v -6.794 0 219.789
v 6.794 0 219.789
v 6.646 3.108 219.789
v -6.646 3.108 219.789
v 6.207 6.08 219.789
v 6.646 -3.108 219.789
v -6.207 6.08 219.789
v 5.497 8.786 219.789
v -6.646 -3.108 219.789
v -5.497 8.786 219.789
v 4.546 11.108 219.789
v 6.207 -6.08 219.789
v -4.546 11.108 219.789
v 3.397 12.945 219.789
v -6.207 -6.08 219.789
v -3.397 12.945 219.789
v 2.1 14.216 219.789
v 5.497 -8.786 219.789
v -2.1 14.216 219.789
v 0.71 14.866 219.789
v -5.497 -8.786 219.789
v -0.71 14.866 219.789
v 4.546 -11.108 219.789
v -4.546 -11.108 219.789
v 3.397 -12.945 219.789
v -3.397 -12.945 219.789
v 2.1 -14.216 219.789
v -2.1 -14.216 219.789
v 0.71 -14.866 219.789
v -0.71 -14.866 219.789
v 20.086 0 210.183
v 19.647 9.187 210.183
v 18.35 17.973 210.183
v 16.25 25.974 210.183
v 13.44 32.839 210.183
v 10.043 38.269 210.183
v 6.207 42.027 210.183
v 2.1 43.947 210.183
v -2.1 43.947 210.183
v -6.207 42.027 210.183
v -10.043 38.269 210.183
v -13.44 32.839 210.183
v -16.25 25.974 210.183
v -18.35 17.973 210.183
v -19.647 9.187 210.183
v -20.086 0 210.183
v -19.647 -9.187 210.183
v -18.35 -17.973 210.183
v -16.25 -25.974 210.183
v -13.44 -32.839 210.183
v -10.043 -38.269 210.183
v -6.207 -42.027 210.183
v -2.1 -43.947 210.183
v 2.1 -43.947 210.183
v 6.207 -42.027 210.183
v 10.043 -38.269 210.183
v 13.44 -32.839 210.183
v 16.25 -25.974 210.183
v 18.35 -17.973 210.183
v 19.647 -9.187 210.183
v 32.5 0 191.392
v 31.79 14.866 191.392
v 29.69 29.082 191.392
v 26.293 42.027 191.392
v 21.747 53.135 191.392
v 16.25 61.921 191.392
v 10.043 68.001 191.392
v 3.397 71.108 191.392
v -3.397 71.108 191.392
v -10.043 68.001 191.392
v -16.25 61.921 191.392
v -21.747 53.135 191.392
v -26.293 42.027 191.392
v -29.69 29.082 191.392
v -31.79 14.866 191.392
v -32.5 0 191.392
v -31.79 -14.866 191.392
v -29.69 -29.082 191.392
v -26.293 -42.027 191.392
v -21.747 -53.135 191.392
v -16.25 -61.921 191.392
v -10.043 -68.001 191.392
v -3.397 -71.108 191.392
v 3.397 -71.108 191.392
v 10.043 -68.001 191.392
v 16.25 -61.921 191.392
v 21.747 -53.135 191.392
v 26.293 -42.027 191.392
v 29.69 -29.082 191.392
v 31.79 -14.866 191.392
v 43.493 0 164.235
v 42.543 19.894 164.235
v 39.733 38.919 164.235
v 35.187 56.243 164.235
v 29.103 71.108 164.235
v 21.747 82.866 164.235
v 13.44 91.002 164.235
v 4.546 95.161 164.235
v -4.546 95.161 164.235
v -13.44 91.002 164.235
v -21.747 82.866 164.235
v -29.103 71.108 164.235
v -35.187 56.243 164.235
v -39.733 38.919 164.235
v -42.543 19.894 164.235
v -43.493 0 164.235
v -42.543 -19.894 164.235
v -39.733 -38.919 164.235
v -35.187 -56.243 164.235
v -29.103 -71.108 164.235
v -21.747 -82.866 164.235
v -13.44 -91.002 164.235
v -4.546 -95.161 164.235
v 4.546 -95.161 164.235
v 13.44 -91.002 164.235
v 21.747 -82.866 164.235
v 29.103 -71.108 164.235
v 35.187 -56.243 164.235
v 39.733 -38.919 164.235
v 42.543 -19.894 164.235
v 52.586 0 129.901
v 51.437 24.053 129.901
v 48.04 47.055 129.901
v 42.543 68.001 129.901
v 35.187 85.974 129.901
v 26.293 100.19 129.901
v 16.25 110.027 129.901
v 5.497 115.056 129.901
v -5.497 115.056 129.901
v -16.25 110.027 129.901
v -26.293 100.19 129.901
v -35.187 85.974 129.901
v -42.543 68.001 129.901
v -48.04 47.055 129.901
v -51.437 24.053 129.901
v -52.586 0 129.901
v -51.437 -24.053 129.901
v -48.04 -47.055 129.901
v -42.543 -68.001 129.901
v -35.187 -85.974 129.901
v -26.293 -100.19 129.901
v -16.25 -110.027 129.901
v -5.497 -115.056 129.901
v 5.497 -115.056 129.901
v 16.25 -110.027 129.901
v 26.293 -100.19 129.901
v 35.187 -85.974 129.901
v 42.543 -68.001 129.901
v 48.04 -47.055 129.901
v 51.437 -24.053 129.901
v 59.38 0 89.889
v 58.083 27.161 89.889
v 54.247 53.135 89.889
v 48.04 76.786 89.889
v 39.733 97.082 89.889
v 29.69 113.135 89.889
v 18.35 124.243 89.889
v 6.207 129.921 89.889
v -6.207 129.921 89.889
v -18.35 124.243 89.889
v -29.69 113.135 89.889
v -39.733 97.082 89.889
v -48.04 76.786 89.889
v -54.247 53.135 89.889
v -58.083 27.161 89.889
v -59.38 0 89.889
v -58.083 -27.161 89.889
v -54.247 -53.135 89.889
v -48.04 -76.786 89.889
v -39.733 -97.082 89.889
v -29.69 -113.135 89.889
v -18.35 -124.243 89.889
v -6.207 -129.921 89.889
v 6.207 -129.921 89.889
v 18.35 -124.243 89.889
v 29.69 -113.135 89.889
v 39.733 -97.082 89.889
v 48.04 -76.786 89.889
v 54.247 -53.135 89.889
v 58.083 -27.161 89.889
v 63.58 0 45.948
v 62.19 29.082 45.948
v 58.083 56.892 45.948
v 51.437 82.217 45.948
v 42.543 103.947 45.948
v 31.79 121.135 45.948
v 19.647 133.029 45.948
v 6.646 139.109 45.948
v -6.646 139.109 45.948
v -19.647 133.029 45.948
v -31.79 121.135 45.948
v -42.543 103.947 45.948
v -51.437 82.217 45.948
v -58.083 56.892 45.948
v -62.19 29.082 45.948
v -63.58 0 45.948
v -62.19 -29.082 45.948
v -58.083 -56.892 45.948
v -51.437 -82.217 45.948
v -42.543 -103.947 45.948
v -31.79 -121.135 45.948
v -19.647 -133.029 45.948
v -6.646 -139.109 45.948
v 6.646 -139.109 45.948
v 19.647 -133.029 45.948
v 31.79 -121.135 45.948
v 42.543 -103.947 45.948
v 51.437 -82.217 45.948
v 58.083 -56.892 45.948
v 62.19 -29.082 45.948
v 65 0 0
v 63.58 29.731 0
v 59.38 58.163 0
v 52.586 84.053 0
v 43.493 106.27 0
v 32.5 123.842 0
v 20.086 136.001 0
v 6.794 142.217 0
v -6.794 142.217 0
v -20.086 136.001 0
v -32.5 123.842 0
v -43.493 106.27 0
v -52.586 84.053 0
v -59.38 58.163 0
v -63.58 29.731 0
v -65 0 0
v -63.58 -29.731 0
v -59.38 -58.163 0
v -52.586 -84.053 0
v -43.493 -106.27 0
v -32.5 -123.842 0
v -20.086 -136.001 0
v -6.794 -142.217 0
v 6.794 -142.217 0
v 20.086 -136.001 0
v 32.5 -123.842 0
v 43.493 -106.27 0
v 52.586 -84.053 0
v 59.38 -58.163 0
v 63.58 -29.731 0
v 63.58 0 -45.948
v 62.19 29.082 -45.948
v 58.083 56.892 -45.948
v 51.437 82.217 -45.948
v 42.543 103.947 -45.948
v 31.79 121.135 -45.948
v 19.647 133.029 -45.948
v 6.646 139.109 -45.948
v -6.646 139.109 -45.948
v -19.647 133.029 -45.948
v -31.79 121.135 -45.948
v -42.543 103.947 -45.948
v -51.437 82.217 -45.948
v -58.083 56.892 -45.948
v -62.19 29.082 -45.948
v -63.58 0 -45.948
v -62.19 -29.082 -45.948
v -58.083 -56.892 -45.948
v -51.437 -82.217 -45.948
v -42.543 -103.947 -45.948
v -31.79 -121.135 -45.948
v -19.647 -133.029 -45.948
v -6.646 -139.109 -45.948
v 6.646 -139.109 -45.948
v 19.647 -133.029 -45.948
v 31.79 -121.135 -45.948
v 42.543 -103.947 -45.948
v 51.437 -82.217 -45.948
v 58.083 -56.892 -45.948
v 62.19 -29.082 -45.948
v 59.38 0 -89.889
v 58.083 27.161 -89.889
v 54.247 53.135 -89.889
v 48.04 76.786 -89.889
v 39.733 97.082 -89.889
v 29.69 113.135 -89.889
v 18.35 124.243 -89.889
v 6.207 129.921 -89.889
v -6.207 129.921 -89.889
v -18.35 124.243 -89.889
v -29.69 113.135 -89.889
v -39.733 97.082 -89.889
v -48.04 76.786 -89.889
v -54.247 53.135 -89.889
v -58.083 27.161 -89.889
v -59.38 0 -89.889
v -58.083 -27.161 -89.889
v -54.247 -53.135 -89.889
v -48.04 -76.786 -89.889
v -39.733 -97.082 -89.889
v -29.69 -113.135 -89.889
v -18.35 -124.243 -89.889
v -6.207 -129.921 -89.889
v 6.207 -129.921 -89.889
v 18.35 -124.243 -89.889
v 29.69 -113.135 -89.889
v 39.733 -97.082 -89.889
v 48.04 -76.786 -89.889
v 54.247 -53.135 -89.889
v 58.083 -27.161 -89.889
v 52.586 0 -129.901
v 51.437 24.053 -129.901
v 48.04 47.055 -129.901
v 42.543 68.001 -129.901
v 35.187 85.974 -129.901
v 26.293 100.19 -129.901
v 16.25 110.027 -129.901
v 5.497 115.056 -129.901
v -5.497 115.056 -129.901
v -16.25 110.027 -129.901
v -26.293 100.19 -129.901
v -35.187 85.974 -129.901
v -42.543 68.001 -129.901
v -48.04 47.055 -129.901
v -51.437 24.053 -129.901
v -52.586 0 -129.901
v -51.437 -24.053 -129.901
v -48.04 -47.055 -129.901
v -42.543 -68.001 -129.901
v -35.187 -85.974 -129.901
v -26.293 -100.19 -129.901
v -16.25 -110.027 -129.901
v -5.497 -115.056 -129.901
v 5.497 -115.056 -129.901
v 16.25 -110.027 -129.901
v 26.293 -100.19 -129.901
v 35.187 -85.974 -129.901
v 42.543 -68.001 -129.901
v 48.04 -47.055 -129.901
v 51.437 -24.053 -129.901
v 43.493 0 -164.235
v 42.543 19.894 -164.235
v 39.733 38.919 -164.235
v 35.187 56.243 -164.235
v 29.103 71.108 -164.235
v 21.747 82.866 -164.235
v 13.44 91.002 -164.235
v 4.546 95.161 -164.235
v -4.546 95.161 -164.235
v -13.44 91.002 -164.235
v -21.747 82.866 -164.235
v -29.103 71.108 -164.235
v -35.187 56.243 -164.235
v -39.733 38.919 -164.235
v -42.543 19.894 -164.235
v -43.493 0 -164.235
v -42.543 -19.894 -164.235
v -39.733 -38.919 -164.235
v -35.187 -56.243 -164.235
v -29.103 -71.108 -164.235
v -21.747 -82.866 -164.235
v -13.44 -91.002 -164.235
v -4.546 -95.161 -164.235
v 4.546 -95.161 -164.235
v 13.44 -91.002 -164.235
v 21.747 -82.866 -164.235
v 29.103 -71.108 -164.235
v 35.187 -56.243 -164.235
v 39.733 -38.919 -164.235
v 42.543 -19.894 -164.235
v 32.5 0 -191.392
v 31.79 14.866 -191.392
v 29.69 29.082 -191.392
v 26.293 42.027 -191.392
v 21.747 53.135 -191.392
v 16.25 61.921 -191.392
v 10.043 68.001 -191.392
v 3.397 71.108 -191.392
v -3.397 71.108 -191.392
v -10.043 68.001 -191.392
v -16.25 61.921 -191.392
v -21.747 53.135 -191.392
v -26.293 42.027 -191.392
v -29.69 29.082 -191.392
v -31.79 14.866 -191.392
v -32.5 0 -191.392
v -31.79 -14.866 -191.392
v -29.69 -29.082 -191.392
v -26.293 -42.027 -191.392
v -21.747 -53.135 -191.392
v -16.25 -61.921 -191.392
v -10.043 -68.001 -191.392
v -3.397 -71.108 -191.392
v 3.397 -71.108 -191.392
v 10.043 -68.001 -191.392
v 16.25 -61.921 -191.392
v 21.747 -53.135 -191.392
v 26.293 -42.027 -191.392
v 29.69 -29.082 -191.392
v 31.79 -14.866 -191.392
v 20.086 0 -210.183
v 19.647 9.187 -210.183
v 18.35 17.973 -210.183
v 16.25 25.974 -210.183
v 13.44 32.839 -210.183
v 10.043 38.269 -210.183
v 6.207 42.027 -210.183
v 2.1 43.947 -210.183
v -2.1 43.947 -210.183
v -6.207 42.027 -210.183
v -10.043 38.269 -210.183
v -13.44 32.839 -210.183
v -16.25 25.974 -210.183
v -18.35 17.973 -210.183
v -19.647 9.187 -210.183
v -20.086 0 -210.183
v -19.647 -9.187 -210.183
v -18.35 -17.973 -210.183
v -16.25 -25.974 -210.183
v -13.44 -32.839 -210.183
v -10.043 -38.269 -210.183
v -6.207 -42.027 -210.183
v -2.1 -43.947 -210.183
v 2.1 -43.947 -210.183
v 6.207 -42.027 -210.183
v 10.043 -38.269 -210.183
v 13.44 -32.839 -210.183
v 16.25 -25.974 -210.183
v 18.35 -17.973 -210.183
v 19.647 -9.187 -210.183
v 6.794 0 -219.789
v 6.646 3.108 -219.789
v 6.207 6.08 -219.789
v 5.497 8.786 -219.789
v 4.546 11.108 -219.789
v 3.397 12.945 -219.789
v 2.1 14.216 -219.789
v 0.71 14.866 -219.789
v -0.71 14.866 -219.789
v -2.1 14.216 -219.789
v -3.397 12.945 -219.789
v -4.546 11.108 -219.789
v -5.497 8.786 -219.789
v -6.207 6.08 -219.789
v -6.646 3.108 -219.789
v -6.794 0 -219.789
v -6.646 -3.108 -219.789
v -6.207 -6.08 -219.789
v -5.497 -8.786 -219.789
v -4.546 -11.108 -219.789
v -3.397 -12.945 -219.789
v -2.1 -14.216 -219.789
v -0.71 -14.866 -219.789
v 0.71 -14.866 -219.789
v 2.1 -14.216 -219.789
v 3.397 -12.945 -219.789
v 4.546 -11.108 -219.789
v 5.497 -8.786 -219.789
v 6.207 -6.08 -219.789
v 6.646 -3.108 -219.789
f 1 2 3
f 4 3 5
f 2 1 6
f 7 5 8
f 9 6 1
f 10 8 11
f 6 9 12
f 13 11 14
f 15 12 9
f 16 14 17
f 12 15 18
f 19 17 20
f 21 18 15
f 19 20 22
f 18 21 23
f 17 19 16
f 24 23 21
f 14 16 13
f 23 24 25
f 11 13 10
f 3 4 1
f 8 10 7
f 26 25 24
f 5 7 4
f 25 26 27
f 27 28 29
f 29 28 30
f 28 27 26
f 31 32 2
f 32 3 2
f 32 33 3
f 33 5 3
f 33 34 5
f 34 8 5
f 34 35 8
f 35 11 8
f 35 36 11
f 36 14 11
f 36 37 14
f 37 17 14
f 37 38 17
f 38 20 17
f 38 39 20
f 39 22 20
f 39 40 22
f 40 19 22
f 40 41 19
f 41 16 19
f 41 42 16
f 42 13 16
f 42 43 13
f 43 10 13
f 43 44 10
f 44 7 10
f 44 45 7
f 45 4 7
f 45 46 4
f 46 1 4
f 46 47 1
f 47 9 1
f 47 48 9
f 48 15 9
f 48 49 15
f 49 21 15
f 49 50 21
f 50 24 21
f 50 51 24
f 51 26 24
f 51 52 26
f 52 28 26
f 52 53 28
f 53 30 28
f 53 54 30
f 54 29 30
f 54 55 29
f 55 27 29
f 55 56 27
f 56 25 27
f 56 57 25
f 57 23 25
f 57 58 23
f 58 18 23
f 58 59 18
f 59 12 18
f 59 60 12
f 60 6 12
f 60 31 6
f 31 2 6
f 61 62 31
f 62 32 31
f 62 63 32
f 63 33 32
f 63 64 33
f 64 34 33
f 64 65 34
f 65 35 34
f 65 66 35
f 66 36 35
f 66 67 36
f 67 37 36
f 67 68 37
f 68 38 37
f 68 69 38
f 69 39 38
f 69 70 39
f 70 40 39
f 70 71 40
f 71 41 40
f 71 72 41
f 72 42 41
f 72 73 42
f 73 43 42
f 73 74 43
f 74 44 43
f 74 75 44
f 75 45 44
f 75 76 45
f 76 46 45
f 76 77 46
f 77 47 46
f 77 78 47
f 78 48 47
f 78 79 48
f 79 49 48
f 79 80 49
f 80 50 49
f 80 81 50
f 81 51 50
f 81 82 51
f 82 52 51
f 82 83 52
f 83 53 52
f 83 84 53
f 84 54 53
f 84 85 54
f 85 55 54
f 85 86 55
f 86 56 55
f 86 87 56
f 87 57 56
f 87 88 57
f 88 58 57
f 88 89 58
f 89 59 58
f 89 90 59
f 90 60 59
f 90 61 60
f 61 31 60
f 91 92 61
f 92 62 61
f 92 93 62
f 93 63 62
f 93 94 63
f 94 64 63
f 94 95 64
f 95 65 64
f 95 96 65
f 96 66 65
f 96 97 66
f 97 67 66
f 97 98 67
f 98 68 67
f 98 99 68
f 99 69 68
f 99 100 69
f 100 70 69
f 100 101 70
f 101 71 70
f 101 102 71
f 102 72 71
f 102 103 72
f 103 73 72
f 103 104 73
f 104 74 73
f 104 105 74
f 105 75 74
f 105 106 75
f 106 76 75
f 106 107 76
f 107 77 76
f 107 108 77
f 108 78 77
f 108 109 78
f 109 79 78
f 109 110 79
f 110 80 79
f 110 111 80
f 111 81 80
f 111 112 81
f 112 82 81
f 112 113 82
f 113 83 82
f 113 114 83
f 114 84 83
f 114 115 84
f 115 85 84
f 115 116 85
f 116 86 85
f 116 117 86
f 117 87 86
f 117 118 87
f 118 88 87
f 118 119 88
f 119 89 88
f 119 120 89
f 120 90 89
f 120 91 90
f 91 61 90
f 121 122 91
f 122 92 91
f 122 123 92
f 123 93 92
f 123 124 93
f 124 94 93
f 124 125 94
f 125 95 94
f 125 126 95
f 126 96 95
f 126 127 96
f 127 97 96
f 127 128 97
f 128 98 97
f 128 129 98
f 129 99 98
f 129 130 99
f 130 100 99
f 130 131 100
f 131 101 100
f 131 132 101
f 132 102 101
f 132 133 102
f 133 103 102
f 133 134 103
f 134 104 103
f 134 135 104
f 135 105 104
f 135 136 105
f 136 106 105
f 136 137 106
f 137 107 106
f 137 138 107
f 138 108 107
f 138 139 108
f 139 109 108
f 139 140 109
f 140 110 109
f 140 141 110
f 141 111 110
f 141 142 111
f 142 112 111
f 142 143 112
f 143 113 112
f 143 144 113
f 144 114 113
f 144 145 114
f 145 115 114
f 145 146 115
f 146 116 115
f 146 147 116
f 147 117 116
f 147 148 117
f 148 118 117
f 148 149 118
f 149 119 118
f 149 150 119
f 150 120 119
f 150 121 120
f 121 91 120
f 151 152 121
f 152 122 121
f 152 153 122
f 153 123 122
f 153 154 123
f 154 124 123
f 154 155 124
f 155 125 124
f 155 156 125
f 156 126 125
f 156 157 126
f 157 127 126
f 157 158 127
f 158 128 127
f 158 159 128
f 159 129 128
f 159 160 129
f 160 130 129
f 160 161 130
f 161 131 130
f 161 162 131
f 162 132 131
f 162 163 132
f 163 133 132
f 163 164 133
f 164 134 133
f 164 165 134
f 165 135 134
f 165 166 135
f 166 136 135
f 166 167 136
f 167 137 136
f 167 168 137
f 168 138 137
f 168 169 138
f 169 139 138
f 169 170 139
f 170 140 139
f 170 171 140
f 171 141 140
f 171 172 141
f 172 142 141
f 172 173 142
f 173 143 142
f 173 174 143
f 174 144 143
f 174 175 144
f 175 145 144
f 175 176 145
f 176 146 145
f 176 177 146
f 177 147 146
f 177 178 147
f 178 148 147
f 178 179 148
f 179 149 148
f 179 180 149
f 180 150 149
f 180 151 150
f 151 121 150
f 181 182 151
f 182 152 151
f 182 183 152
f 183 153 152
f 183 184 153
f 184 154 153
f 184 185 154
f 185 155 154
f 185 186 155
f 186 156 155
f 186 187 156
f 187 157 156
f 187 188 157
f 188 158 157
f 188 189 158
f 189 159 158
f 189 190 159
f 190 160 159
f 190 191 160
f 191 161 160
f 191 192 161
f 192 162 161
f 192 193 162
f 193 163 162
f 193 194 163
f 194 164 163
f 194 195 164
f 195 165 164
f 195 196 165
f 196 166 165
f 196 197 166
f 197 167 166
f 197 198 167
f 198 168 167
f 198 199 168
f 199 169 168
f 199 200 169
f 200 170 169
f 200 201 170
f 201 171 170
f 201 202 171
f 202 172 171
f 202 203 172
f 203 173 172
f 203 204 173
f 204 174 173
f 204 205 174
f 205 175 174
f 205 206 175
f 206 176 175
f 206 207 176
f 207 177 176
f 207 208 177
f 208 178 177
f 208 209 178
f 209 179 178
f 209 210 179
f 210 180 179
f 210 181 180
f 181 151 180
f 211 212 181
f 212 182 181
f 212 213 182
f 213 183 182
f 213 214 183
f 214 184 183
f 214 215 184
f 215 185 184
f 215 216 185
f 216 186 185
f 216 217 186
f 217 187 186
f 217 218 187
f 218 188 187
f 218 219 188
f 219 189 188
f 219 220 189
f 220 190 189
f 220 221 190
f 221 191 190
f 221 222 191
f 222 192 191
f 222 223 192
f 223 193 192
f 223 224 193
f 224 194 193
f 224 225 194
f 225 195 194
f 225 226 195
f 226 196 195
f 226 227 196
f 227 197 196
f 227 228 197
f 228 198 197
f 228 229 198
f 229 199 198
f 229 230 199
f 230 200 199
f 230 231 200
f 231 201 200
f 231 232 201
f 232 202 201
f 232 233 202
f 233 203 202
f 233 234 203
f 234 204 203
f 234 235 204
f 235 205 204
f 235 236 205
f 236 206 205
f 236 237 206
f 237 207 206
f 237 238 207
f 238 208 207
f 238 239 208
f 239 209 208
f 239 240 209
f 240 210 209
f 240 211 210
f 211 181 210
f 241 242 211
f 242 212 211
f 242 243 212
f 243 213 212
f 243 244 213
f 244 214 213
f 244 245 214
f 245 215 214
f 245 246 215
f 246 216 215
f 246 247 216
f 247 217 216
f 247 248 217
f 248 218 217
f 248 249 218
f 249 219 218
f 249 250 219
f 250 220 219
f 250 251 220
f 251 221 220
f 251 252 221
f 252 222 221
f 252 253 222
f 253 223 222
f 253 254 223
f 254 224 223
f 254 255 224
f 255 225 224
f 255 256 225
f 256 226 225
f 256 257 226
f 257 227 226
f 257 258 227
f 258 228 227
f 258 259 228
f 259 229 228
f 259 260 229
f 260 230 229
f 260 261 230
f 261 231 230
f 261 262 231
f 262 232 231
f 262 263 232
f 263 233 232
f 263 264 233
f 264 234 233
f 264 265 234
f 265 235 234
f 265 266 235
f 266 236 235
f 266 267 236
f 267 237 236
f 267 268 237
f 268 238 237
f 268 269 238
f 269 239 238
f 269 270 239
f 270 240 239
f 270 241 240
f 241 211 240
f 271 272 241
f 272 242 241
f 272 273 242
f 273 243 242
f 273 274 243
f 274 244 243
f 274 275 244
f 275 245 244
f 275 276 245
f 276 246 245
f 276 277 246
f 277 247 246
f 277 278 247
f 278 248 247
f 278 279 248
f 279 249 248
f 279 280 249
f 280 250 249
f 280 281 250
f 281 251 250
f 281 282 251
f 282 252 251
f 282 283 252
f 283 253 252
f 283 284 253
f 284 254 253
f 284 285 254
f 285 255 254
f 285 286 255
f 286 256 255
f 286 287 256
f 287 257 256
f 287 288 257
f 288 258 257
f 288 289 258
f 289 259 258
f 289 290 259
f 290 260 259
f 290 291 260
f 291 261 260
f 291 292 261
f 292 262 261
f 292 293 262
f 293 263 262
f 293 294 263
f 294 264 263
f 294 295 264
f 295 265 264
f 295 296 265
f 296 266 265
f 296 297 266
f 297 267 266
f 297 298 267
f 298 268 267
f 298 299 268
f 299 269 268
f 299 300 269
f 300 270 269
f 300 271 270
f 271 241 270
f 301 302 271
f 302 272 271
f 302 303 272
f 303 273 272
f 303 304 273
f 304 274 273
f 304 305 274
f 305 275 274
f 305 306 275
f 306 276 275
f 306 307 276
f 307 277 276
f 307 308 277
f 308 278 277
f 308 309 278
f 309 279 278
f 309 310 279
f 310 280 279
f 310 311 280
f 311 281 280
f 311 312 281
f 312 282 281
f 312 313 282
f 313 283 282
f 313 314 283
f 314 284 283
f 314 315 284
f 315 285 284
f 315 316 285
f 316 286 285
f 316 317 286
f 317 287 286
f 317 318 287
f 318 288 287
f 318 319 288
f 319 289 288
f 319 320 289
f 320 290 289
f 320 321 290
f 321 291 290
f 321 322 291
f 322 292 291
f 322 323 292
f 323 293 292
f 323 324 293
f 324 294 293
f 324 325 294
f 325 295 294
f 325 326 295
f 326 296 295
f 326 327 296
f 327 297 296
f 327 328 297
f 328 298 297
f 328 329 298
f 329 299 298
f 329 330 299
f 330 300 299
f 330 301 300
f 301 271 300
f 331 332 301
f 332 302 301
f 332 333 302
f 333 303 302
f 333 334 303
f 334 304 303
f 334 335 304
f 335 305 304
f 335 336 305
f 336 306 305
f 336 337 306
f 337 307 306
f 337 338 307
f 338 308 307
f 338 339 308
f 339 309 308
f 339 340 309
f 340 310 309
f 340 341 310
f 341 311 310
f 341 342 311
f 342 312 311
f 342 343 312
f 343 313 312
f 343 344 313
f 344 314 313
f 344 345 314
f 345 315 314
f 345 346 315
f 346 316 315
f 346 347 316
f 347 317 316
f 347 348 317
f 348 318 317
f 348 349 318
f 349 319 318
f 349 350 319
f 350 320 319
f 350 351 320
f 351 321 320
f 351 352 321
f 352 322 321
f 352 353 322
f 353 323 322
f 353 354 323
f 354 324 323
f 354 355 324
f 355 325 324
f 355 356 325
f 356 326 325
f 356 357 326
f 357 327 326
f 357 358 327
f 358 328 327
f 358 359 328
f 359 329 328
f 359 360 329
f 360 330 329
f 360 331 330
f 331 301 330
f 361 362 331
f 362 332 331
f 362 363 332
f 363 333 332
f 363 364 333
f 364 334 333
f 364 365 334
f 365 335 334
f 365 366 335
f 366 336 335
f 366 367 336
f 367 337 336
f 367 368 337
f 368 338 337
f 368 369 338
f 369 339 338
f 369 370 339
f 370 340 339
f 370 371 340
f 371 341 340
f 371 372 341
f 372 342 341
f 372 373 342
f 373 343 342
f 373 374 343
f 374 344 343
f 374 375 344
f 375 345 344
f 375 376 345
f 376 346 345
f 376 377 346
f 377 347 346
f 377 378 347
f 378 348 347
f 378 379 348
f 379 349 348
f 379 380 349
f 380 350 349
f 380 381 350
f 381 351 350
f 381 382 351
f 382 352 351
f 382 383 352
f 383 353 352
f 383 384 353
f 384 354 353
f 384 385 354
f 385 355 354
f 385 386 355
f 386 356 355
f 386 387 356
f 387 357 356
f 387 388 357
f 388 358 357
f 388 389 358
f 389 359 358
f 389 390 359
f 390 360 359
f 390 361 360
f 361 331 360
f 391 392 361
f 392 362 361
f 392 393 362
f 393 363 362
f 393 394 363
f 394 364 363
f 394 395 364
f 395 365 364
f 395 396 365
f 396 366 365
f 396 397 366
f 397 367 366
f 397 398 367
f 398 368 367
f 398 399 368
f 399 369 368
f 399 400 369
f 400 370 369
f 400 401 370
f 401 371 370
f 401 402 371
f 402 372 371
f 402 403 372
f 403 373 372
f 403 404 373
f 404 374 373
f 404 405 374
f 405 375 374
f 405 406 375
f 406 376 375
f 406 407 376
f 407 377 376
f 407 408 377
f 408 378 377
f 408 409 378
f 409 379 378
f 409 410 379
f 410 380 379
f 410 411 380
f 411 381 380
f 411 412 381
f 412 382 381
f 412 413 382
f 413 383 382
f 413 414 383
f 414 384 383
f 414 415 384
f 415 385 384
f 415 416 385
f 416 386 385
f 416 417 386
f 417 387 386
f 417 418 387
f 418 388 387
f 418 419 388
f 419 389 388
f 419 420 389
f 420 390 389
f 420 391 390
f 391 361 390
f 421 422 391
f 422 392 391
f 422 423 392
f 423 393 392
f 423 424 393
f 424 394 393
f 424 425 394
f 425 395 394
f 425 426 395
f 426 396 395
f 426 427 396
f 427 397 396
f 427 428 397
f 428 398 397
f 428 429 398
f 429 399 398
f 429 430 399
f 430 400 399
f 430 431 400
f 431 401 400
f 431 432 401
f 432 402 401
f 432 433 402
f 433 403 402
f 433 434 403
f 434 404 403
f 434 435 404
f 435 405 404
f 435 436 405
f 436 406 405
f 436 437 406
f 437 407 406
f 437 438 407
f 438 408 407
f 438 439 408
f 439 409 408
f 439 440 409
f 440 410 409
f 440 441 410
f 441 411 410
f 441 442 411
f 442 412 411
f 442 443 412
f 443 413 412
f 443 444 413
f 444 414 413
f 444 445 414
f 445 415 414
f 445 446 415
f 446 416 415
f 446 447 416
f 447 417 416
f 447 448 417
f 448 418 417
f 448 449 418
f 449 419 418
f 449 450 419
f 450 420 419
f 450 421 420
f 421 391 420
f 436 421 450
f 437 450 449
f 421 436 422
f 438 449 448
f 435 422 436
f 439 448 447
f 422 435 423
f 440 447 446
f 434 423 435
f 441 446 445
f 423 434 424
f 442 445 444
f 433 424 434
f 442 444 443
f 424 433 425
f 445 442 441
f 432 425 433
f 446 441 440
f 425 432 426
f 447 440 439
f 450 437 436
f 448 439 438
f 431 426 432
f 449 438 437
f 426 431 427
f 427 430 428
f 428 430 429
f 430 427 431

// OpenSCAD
// Generated by SolidPython 1.0.1 on 2020-07-29 00:46:46


scale(v = [5, 11, 17]) {
	sphere(r = 13);
}
/***********************************************
*********      SolidPython code:      **********
************************************************
 
# import packages: SolidPython
from solid import *
from solid.utils import *
from itertools import chain, combinations, permutations


class Resize:

    def __init__(self, scad_file):
        self.scad_file = scad_file
        #self.scad_file = import_scad(scad_file)
        # cone/cylinder param:
        self.r1 = 0
        self.r2 = 0
        self.h = 0
        # rectangular prism param:
        self.w = 0
        self.l = 0
        # ellipse param:
        self.r = 0

    # import OpenScad code (file name corresponds to shape)


    # classify shape + parameters
    def assign(self, param1, param2, param3):
        if self.scad_file == 'cone.scad':
            self.r1 = param1
            self.r2 = param2
            self.h = param3
        elif self.scad_file == 'cylinder.scad':
            self.r1 = param1
            self.r2 = param2
            self.h = param3
        elif self.scad_file == 'rectangularPrism.scad':
            self.h = param1
            self.l = param2
            self.w = param3
        else:
            self.r = param1
            self.h = param2

    # resize parameters
    def iterate(self):
        x = range(3, 20, 2)
        i = 1
        if self.scad_file == 'cone.scad':
            tempList = list(permutations(x, 2))
            for temp in tempList:
                param1 = temp[0]
                param2 = temp[1]
                filepath = 'produced_scad_files/' + 'cone' + str(param1) + '_' + str(param2) + '_' + '.scad'
                scad_render_to_file(cylinder(h=param1, r1=param2, r2=0), filepath)

        elif self.scad_file == 'cylinder.scad':
            tempList = list(permutations(x, 3))
            for temp in tempList:
                param1 = temp[0]
                param2 = temp[1]
                filepath = 'produced_scad_files/' + 'cylinder' + str(param1) + '_' + str(param2) + '_' + '.scad'
                scad_render_to_file(cylinder(h=param1, r1=param2, r2=param2), filepath)

        elif self.scad_file == 'rectangularPrism.scad':
            tempList = list(permutations(x, 3))
            for temp in tempList:
                param1 = temp[0]
                param2 = temp[1]
                param3 = temp[2]
                filepath = 'produced_scad_files/' + 'rectangularPrism' + str(param1) + '_' + str(param2) + '_' + str(
                    param3) + '.scad'
                scad_render_to_file(cube(size=(param1, param2, param3)), filepath)

        elif self.scad_file == 'ellipse.scad':
            tempList = list(permutations(x, 4))
            for temp in tempList:
                param1 = temp[0]
                param2 = temp[1]
                param3 = temp[2]
                param4 = temp[3]
                filepath = 'produced_scad_files/' + 'ellipse' + str(param1) + '_' + str(param2) + '_' + str(param3) + '_' + str(param4) + '.scad'
                scad_render_to_file(scale([param1, param2, param3])(sphere(r=param4)), filepath)

    def render_to_scadfile(self):
        scad_render_to_file(scad, 'example.scad') 
 
************************************************/
